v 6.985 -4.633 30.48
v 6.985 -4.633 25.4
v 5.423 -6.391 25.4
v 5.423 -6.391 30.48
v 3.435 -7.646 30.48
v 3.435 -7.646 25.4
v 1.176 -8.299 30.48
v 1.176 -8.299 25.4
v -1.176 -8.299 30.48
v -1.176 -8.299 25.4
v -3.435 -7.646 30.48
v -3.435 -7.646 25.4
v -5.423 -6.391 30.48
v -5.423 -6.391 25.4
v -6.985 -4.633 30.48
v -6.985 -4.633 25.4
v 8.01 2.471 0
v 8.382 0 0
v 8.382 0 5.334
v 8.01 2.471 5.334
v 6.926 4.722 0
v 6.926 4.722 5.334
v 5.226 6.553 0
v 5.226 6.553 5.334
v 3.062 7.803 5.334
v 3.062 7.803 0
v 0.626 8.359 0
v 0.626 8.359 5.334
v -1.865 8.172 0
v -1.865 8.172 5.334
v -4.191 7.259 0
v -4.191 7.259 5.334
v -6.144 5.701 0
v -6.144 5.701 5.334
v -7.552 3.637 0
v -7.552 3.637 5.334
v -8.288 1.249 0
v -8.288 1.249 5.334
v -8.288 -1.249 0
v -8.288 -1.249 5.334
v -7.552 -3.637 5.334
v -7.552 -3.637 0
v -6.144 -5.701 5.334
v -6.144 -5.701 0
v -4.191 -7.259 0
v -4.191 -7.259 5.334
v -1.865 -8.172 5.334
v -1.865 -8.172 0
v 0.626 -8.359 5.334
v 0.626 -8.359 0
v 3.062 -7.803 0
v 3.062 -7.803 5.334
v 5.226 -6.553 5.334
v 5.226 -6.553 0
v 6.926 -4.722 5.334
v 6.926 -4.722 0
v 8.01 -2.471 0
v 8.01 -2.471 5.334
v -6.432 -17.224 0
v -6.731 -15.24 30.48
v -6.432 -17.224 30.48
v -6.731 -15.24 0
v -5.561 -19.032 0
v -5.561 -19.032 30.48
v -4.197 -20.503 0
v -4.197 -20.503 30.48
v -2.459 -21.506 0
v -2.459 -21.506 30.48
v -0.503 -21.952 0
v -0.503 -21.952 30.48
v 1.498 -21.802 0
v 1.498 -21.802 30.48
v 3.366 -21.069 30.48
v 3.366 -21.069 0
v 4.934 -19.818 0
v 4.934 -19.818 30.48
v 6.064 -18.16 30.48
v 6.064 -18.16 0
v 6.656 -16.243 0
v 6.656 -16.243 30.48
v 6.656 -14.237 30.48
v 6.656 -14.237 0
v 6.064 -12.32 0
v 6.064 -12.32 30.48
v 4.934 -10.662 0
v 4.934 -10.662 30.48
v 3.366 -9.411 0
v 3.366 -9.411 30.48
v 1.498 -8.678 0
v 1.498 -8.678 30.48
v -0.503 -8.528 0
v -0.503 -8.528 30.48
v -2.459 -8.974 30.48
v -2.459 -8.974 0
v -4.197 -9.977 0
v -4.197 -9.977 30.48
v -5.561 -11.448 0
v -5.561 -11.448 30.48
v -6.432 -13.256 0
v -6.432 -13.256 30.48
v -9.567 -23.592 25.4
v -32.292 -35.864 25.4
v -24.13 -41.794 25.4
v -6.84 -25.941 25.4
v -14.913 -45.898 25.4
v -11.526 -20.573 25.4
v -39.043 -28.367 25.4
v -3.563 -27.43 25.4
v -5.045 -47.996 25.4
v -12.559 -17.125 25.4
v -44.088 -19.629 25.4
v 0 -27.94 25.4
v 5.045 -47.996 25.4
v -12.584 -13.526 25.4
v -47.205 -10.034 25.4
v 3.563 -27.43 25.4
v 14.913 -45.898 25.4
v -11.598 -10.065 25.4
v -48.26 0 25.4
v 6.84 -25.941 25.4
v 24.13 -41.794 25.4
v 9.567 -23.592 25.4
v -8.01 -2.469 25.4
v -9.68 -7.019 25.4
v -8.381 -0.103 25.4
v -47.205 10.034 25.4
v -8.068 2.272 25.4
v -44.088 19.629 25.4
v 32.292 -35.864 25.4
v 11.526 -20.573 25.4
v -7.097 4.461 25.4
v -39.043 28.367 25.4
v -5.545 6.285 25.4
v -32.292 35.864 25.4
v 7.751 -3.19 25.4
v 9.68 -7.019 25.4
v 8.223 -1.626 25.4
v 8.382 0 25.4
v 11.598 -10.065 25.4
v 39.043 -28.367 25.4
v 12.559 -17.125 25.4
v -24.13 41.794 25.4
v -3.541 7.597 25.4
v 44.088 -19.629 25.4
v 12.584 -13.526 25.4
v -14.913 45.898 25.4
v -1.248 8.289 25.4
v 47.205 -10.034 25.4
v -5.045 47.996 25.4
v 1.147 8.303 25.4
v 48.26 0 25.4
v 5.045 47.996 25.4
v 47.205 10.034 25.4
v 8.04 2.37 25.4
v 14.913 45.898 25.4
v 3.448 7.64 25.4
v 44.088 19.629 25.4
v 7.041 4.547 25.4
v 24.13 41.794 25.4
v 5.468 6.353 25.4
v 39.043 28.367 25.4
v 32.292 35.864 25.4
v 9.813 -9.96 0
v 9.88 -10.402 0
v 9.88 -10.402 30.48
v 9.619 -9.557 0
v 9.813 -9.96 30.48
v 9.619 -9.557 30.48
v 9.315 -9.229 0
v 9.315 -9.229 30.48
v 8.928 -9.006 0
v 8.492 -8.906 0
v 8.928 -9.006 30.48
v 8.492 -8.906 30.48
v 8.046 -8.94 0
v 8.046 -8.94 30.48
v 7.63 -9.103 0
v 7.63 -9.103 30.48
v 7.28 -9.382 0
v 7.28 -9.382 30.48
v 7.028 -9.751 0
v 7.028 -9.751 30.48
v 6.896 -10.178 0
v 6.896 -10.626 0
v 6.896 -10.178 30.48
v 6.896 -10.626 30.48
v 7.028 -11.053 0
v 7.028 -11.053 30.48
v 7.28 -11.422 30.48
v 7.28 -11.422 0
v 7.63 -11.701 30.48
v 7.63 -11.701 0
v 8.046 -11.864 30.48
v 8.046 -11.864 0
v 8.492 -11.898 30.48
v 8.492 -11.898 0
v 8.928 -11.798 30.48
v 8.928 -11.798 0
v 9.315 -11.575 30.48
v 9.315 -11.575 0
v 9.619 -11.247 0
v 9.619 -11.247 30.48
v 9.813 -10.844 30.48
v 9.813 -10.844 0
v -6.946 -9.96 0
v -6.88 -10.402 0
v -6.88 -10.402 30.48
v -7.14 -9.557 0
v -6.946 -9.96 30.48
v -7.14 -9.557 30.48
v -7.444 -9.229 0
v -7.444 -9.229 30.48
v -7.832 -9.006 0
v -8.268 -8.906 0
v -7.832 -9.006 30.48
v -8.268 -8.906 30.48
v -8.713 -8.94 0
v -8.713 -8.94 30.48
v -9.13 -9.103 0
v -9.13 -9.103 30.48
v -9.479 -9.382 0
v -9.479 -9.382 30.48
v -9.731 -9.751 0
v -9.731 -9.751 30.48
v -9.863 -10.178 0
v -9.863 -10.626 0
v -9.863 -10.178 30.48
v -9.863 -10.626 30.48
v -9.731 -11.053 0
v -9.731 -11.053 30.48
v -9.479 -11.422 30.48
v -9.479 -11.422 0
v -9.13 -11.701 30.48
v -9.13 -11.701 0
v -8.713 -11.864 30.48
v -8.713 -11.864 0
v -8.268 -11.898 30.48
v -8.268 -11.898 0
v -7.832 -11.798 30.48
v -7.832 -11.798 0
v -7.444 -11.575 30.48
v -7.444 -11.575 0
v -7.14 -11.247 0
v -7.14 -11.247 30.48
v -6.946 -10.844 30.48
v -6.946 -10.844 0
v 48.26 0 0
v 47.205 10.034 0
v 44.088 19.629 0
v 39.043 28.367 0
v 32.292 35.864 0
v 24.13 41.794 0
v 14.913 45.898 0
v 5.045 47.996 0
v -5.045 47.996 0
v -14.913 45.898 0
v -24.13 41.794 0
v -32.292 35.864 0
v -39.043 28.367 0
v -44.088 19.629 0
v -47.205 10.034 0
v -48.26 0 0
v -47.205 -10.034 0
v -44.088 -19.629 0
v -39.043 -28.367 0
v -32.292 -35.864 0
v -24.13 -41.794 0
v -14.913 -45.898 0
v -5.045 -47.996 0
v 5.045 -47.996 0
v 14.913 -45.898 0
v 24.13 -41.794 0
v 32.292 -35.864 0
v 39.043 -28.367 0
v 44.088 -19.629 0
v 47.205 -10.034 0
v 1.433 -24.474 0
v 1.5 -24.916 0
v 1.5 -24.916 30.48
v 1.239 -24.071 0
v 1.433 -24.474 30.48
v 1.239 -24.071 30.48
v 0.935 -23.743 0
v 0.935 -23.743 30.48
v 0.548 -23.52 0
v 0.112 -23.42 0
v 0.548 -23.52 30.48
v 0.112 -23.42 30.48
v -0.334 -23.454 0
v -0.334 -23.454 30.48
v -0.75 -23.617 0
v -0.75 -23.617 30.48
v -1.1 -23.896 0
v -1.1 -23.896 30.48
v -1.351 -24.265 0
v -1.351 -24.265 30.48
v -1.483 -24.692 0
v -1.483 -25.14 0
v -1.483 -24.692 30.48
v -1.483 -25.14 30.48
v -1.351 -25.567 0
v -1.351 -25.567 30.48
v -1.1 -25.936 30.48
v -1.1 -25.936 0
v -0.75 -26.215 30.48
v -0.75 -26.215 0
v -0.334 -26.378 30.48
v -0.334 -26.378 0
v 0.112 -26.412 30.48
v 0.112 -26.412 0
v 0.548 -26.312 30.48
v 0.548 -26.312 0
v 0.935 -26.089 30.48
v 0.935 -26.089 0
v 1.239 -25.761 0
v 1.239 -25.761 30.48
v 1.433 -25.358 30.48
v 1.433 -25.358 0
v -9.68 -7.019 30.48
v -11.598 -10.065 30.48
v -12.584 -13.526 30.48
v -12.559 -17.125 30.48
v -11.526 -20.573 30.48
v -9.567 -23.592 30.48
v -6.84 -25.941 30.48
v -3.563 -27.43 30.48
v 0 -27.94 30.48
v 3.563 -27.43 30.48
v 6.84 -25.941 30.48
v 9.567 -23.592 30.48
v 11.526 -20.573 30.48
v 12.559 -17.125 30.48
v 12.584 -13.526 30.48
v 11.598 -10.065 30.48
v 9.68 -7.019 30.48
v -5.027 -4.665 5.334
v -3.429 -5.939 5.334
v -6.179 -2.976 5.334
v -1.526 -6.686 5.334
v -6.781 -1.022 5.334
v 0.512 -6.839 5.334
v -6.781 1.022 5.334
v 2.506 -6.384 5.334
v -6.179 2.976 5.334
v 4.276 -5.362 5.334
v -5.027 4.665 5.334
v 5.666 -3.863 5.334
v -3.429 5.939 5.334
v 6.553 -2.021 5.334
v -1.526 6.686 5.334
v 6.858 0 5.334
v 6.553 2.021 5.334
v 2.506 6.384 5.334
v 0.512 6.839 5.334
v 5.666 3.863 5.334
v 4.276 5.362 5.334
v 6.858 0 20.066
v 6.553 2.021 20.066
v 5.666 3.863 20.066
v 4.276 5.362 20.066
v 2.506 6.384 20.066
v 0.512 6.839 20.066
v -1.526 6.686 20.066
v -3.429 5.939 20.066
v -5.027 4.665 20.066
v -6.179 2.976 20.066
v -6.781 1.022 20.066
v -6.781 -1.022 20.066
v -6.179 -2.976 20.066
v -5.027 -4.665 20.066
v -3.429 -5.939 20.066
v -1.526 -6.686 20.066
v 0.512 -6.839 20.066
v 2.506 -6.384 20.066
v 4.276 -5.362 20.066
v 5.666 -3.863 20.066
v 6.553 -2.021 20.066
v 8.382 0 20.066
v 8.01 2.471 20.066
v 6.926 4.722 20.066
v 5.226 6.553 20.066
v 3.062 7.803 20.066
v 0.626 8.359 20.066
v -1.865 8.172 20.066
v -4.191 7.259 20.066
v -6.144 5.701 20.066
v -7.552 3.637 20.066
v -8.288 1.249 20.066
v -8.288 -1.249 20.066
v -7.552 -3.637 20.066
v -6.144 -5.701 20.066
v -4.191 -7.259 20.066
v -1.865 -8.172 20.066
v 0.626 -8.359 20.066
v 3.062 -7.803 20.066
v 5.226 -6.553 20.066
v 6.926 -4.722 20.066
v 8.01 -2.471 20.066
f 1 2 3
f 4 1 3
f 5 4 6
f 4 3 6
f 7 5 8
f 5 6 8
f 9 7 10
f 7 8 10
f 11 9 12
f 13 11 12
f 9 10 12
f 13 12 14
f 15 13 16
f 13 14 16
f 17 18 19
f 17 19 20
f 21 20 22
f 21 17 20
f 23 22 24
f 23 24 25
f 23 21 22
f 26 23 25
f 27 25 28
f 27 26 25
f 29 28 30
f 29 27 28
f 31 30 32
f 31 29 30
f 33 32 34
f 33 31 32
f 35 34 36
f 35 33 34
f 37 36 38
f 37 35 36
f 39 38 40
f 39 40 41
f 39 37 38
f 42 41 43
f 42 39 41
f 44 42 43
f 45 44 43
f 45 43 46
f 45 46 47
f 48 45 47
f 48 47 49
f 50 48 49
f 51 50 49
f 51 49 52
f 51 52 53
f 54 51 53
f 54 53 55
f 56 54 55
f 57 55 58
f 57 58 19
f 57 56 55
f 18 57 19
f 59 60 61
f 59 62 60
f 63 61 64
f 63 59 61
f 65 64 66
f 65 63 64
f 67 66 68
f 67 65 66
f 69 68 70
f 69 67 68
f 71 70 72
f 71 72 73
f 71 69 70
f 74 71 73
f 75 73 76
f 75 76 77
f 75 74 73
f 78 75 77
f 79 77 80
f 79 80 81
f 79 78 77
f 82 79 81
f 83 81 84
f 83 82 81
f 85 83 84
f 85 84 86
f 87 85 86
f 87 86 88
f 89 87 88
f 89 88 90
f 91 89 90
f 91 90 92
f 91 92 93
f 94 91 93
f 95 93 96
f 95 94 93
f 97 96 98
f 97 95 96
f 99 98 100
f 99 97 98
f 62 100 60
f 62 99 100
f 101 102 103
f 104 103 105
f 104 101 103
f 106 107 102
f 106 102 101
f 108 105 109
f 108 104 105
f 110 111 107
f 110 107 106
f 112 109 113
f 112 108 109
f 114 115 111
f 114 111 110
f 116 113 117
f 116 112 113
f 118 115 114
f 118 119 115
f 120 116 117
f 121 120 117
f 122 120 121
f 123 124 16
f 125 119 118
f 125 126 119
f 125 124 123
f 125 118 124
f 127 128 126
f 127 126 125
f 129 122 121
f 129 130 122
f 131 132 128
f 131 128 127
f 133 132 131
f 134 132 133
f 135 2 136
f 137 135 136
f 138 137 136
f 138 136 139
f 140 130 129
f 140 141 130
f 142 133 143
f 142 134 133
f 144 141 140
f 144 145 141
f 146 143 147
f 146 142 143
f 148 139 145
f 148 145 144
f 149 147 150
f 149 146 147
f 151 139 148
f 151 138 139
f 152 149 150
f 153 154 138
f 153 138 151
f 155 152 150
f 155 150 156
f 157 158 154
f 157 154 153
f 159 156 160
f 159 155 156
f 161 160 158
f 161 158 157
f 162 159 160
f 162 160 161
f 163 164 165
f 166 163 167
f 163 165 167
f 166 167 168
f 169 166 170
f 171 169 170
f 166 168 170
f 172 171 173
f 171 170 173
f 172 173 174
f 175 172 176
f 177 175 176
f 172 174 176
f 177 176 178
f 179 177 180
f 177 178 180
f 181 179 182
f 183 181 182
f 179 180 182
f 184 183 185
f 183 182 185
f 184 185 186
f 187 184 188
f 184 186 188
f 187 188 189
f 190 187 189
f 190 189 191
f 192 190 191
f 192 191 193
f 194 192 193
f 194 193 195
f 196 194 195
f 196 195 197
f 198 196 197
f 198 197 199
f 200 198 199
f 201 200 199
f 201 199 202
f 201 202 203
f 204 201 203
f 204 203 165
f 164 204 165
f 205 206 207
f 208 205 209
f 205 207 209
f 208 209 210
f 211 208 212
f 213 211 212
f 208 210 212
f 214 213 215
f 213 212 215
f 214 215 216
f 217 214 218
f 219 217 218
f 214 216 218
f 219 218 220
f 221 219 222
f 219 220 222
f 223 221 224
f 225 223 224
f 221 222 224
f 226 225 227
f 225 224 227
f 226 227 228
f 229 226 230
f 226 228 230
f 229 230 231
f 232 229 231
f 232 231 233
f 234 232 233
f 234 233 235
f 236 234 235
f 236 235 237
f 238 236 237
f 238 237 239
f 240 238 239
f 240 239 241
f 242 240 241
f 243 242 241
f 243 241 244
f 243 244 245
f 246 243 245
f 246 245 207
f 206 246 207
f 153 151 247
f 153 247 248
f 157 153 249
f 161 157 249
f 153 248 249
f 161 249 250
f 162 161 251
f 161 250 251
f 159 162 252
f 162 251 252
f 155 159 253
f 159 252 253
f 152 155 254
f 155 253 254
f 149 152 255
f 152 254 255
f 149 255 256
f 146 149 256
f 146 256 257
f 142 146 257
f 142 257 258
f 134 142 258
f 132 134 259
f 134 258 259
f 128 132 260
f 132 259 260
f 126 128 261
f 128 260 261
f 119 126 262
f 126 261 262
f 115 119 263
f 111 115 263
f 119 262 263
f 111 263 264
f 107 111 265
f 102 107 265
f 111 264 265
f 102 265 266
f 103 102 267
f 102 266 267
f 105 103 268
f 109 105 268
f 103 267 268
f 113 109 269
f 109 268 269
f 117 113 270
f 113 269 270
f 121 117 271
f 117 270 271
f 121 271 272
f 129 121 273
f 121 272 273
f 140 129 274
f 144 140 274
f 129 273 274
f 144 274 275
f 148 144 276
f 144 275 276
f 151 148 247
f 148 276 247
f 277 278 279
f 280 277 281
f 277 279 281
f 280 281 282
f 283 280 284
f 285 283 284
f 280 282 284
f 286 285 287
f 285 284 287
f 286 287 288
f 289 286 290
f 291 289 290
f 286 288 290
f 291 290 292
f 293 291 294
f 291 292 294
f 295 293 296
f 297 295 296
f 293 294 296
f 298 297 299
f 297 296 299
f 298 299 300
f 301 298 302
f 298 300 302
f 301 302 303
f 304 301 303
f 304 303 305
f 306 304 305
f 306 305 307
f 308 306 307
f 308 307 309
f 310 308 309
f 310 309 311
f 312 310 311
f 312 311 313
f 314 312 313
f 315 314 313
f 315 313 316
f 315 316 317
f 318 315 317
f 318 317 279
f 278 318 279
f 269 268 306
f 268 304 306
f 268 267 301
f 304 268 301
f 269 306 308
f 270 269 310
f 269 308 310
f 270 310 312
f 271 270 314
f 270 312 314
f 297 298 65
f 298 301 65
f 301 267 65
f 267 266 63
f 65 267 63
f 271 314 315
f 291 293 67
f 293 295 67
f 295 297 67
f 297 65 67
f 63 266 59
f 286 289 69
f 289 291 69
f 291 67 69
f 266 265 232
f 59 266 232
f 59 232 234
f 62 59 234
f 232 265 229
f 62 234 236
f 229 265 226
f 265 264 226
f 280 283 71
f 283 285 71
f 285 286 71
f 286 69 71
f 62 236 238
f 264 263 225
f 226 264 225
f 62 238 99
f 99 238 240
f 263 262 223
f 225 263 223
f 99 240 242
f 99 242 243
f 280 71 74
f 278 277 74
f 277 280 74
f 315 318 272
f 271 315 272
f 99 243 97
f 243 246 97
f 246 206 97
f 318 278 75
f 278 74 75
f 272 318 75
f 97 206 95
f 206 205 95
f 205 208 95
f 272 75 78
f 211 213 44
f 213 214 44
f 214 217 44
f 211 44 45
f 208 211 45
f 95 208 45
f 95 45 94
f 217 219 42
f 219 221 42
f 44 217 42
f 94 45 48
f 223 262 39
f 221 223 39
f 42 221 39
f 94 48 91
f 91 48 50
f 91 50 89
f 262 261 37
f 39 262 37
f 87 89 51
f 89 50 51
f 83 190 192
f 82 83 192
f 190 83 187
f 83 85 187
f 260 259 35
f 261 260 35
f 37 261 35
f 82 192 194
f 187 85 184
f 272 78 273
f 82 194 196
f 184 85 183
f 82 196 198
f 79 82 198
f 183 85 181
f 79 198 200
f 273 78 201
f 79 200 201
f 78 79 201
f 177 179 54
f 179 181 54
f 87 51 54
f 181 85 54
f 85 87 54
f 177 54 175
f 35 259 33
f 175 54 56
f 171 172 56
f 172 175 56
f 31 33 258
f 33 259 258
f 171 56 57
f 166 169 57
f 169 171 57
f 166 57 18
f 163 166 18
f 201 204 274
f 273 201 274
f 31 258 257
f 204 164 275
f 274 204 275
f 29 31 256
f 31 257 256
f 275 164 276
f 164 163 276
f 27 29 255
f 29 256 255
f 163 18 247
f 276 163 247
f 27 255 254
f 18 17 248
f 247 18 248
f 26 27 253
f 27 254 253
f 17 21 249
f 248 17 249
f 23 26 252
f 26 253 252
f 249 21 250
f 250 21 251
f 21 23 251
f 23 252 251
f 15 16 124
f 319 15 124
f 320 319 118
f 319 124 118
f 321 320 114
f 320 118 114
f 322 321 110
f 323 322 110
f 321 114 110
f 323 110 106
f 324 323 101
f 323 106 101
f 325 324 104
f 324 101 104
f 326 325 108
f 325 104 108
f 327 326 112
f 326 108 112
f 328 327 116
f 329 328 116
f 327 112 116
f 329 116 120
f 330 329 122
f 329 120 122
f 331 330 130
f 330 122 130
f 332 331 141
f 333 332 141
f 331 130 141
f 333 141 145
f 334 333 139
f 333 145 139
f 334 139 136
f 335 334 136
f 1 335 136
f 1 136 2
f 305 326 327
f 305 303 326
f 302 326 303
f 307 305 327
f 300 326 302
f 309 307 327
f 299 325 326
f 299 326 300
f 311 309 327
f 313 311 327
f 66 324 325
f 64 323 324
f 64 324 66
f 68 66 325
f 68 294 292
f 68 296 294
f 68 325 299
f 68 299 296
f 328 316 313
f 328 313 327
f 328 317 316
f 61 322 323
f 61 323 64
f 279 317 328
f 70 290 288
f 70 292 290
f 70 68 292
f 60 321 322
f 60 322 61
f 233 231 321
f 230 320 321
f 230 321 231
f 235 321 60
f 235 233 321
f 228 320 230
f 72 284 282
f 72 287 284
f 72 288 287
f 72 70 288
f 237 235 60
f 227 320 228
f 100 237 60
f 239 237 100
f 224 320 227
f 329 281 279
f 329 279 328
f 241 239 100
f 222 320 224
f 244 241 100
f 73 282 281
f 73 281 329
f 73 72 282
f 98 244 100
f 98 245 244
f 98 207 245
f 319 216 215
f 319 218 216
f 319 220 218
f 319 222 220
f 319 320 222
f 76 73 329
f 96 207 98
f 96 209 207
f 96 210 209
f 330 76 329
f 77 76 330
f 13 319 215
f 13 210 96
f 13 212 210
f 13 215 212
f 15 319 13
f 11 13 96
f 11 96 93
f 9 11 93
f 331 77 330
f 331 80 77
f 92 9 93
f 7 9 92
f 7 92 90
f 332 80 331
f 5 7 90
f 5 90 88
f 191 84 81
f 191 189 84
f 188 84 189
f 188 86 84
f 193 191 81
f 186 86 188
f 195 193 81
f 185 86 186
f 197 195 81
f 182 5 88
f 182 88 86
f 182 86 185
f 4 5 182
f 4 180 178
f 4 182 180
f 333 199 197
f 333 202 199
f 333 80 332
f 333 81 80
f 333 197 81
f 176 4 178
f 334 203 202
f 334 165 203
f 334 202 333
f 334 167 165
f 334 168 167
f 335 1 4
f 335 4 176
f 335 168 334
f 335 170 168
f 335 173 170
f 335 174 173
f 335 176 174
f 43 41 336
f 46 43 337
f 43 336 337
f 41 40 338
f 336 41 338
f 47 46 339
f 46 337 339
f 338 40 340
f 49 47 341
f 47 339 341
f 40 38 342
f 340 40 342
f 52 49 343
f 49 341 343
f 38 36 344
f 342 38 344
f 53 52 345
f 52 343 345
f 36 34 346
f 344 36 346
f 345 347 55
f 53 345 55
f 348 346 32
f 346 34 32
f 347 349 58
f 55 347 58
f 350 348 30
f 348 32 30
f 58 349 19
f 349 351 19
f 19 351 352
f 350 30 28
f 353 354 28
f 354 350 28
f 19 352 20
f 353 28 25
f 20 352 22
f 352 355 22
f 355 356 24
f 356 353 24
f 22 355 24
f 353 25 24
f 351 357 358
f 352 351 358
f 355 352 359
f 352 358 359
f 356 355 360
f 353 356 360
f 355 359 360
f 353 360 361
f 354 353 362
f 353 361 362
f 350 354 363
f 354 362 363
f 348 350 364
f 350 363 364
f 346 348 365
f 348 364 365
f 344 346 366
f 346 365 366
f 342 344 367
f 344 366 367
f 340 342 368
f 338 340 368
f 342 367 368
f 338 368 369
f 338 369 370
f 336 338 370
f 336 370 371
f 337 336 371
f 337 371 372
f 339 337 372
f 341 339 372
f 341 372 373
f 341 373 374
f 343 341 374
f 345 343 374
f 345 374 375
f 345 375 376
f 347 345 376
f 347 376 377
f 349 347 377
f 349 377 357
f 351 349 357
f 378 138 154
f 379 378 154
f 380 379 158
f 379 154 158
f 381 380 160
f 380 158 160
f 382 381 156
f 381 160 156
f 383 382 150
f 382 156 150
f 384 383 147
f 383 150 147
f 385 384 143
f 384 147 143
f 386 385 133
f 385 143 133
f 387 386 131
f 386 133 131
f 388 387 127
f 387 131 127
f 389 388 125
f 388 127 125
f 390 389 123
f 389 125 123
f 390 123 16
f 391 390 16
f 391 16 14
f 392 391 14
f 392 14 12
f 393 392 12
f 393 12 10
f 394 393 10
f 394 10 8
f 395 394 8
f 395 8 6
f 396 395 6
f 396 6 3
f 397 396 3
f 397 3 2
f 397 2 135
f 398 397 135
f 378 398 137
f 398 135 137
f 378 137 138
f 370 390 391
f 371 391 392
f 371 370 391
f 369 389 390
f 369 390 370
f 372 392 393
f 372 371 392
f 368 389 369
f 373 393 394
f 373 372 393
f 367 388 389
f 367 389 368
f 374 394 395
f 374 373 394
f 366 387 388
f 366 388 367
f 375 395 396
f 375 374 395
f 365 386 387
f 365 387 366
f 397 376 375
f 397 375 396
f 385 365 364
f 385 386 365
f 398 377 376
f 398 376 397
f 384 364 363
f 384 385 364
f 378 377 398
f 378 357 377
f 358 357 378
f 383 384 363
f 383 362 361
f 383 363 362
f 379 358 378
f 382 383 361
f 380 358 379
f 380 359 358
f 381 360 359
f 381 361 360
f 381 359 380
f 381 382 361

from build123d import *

# Parameters (mm, degrees)
SKETCH1_R           = 48.26
BOSS_EXTRUDE1_DEPTH = 25.4
SKETCH2_R           = 8.382
CUT_EXTRUDE1_DEPTH  = 5.334
SKETCH12_R          = 6.731
CUT_EXTRUDE5_DEPTH  = 73.823177629
SKETCH15_R          = 6.731
BOSS_EXTRUDE2_DEPTH = 5.08
SKETCH16_R          = 1.5
CUT_EXTRUDE9_DEPTH  = 75.746809965
SKETCH14_R          = 6.858
CUT_EXTRUDE8_DEPTH  = 73.823177629


with BuildPart() as part:
    # Sketch1 → Boss-Extrude1 (new body)
    with BuildSketch(Plane.XY):
        Circle(SKETCH1_R)
    extrude(amount=BOSS_EXTRUDE1_DEPTH)

    # Sketch2 → Cut-Extrude1 (cut)
    with BuildSketch(Plane.XY.offset(25.4)):
        Circle(SKETCH2_R)
    cut_extrude1 = extrude(amount=-CUT_EXTRUDE1_DEPTH, mode=Mode.SUBTRACT)

    # Sketch12 → Cut-Extrude5 (cut, through all)
    with BuildSketch(Plane(origin=(0, 0, 0), x_dir=(-1, 0, 0), z_dir=(0, 0, -1))):
        with Locations((0, -15.24)):
            Circle(SKETCH12_R)
    extrude(amount=-CUT_EXTRUDE5_DEPTH, mode=Mode.SUBTRACT)

    # Sketch15 → Boss-Extrude2 (add)
    with BuildSketch(Plane.XY.offset(25.4)):
        with BuildLine():
            ThreePointArc((6.984961194, -4.633383333), (0, -8.382), (-6.984961194, -4.633383333))
            ThreePointArc((-6.984961194, -4.633383333), (0, -27.94), (6.984961194, -4.633383333))
        make_face()
        with Locations(Location((0, -15.24, 0), (0, 0, 180))):
            Circle(SKETCH15_R, mode=Mode.SUBTRACT)
    extrude(amount=BOSS_EXTRUDE2_DEPTH)

    # Sketch16 → Cut-Extrude9 (cut, through all)
    with BuildSketch(Plane.XY.offset(30.48)):
        with Locations((8.379661807, -10.402)):
            Circle(SKETCH16_R)
        with Locations((0, -24.916)):
            Circle(SKETCH16_R)
        with Locations((-8.379661807, -10.402)):
            Circle(SKETCH16_R)
    extrude(amount=-CUT_EXTRUDE9_DEPTH, mode=Mode.SUBTRACT)

    # Mirror1: Cut-Extrude1 across plane
    add(cut_extrude1.mirror(Plane.XY.offset(12.7)), mode=Mode.SUBTRACT)

    # Sketch14 → Cut-Extrude8 (cut, through all)
    with BuildSketch(Plane.XY.offset(25.4)):
        Circle(SKETCH14_R)
    extrude(amount=-CUT_EXTRUDE8_DEPTH, mode=Mode.SUBTRACT)


solid = part.part
